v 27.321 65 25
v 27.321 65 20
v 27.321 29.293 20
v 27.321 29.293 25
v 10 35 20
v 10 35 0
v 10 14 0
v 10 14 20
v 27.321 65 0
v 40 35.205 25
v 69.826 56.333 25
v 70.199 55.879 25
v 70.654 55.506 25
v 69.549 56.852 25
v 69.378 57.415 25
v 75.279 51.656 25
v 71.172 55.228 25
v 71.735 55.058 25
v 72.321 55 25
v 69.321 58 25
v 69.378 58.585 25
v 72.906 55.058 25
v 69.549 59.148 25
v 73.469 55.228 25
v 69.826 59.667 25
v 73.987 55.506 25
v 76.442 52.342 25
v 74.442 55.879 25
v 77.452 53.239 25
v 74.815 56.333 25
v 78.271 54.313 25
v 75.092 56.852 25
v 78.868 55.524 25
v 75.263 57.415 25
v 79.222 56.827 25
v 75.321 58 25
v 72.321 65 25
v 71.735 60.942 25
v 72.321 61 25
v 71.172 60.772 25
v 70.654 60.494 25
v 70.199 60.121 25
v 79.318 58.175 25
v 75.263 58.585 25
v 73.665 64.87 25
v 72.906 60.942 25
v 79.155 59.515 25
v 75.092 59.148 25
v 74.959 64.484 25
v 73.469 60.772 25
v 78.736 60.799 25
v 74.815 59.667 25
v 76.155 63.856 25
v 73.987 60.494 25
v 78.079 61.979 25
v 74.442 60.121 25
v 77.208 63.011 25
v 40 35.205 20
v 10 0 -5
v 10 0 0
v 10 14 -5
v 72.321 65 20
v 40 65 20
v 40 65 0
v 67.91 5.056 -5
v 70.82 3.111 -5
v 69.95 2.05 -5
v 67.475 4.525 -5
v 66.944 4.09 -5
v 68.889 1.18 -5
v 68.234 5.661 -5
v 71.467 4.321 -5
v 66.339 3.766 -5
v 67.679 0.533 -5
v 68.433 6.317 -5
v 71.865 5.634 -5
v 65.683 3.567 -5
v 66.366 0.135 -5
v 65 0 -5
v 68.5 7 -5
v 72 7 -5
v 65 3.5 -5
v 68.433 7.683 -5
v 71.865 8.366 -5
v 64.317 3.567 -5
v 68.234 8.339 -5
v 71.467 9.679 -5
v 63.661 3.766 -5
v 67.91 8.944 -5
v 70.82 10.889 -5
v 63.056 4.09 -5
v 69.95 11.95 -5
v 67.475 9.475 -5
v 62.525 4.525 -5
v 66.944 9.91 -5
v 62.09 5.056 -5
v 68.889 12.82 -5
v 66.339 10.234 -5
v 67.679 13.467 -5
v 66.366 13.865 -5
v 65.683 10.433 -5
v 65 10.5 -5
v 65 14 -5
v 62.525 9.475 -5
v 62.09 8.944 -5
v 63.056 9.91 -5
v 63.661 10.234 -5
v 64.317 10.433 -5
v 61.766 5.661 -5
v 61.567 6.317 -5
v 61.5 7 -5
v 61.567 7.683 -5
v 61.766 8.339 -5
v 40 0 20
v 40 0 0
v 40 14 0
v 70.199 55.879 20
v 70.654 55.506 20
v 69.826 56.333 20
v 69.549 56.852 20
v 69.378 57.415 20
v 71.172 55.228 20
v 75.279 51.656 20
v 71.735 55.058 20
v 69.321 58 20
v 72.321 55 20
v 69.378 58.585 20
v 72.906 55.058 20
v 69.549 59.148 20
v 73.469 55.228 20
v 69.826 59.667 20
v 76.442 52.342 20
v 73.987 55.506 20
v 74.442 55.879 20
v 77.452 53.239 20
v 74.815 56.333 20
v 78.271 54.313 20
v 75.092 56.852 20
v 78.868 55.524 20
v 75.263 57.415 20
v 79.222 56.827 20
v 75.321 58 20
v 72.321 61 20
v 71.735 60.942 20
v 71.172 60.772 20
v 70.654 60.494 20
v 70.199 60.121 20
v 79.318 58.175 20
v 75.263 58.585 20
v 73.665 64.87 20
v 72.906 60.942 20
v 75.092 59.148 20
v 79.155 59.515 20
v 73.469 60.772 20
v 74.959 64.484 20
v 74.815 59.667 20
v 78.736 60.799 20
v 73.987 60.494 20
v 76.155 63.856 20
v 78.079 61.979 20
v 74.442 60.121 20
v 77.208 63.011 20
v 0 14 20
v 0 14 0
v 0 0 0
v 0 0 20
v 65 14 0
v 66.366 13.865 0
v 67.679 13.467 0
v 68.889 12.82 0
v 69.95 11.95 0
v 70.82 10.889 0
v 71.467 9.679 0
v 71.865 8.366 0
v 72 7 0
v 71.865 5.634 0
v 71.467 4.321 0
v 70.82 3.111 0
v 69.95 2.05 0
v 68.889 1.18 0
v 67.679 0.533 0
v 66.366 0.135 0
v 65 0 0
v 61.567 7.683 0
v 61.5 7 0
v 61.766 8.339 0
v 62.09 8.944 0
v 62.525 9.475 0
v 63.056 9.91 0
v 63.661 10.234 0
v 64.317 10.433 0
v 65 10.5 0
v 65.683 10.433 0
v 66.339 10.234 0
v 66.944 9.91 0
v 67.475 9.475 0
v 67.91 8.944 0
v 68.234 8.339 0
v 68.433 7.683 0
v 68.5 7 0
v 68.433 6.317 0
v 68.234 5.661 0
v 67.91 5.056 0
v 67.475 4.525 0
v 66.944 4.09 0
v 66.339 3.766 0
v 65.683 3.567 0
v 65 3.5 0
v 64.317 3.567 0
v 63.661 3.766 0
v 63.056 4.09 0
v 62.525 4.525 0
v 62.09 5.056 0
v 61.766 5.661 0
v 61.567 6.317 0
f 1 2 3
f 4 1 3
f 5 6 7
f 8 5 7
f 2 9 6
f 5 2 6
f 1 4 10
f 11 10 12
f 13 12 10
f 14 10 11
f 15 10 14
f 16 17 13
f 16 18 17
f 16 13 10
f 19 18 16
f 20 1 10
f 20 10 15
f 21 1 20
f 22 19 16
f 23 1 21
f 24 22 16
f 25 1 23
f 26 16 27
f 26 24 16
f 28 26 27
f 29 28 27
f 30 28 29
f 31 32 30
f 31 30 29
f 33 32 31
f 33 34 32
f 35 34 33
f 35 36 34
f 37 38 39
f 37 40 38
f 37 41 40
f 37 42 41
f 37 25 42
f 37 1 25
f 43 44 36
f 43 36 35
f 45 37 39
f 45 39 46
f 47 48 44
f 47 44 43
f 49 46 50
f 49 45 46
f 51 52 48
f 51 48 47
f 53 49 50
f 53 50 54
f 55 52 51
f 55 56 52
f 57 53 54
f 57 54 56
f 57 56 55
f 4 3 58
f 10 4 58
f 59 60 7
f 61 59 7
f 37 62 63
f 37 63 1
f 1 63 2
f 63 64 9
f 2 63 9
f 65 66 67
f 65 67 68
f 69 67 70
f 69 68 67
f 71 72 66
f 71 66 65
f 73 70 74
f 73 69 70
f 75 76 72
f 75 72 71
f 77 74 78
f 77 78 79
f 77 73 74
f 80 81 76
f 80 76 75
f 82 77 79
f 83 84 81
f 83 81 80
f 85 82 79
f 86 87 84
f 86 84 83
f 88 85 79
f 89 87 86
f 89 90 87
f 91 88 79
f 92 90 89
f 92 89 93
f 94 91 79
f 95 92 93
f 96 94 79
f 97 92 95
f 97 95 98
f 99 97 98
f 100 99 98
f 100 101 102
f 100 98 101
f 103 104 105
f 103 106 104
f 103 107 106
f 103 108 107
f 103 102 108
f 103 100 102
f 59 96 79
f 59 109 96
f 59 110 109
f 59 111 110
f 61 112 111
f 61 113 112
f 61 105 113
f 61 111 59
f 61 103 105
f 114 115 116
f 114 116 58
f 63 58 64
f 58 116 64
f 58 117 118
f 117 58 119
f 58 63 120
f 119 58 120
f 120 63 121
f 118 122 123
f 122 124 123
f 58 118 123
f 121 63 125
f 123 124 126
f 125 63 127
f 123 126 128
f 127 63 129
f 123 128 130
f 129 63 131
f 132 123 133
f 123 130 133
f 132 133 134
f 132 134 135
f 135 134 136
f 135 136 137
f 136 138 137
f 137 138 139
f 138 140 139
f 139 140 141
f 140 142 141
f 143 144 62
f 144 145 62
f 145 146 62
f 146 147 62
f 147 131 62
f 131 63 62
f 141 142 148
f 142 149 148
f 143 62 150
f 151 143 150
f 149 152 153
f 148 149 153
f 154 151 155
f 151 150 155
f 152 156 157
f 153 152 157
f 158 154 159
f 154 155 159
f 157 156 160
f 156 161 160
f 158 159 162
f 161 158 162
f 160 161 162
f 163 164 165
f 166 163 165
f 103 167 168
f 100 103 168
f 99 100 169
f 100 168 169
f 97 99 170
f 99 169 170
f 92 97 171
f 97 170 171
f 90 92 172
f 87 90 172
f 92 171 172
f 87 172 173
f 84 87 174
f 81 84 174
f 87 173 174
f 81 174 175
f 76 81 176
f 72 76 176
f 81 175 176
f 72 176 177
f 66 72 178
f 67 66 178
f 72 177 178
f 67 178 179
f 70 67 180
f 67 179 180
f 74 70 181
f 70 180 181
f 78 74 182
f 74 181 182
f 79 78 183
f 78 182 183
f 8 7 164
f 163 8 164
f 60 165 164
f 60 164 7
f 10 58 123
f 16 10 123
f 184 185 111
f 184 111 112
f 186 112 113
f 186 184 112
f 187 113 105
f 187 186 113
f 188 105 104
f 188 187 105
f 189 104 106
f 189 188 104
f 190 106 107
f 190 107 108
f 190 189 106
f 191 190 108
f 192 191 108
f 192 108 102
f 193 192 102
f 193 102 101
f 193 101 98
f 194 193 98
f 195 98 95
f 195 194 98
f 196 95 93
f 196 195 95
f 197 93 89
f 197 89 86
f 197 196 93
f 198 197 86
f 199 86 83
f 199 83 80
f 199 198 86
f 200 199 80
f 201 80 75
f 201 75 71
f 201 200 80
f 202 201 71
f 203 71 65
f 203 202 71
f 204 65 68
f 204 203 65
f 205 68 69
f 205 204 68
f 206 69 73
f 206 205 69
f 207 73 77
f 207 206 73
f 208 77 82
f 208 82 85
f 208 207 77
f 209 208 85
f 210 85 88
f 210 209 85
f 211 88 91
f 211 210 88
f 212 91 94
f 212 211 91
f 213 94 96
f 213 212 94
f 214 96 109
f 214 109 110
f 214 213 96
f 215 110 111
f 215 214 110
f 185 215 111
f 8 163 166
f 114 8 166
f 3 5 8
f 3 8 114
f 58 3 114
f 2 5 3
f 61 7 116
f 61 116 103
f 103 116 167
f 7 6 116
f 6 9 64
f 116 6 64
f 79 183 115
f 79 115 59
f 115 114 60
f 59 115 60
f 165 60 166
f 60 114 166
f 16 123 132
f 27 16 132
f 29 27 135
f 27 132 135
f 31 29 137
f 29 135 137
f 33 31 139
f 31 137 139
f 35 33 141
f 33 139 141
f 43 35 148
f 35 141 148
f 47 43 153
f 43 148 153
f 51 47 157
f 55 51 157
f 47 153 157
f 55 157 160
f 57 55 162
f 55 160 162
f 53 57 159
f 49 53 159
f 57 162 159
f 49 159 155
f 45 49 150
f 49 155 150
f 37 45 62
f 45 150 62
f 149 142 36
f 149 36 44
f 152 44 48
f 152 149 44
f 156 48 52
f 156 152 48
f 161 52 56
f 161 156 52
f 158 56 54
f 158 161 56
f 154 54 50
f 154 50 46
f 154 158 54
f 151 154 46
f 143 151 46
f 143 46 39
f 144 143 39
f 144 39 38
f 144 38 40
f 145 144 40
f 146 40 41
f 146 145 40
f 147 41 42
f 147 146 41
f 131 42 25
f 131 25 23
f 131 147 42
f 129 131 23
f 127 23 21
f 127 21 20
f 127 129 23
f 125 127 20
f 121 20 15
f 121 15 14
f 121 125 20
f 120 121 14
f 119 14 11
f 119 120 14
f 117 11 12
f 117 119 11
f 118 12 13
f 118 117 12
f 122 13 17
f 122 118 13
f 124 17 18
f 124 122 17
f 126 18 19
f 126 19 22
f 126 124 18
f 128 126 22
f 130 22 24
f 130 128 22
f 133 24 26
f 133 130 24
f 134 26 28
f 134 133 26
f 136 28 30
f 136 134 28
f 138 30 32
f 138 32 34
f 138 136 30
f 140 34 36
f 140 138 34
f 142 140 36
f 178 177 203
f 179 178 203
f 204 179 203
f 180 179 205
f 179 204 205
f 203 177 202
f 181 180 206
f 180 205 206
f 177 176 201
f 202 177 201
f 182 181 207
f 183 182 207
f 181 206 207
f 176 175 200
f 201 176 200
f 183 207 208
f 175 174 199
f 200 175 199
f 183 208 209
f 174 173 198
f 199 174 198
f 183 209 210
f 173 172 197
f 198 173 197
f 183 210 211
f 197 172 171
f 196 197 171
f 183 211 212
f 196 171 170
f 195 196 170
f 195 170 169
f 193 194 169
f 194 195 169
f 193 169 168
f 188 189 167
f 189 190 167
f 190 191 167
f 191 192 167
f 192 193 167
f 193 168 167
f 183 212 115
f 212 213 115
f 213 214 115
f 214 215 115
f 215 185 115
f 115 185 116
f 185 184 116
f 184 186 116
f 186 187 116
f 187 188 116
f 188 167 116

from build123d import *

# Parameters (mm, degrees)
BOSS_EXTRUDE1_DEPTH = 20
SKETCH2_R           = 7
SKETCH2_R_2         = 3
BOSS_EXTRUDE2_DEPTH = 5
SKETCH3_W           = 30
SKETCH3_H           = 14
SKETCH3_R           = 7
SKETCH3_R_2         = 3.5
BOSS_EXTRUDE3_DEPTH = 5


with BuildPart() as part:
    # Sketch1 → Boss-Extrude1 (new body)
    with BuildSketch(Plane.XY):
        Polygon((0, 0), (40, 0), (40, 65), (27.320508076, 65), (10, 35), (10, 14), (0, 14), align=None)
    extrude(amount=BOSS_EXTRUDE1_DEPTH)

    # Sketch2 → Boss-Extrude2 (add)
    # profile 1 of 3: a face of its own
    with BuildSketch(Plane.XY.offset(20)):
        Polygon((40, 65), (27.320508076, 65), (27.320508076, 29.29250995), (40, 35.205054136), align=None)
    # profile 2 of 3: a face of its own
    with BuildSketch(Plane.XY.offset(20)):
        with BuildLine():
            Line((72.320508076, 65), (40, 65))
            Line((40, 65), (40, 35.205054136))
            Line((40, 35.205054136), (75.278835908, 51.655845491))
            ThreePointArc((75.278835908, 51.655845491), (65.486436026, 56.484922702), (72.320508076, 65))
        make_face()
    # profile 3 of 3: a face of its own
    with BuildSketch(Plane.XY.offset(20)):
        with Locations((72.320508076, 58)):
            Circle(SKETCH2_R)
        with Locations((72.320508076, 58)):
            Circle(SKETCH2_R_2, mode=Mode.SUBTRACT)
    extrude(amount=BOSS_EXTRUDE2_DEPTH)

    # Sketch3 → Boss-Extrude3 (add)
    # profile 1 of 3: a face of its own
    with BuildSketch(Plane(origin=(0, 0, 0), x_dir=(-1, 0, 0), z_dir=(0, 0, -1))):
        with BuildLine():
            Line((-40, 0), (-40, 14))
            Line((-40, 14), (-65, 14))
            ThreePointArc((-65, 14), (-60.050252532, 11.949747468), (-58, 7))
            ThreePointArc((-58, 7), (-60.050252532, 2.050252532), (-65, 0))
            Line((-65, 0), (-40, 0))
        make_face()
    # profile 2 of 3: a face of its own
    with BuildSketch(Plane(origin=(0, 0, 0), x_dir=(-1, 0, 0), z_dir=(0, 0, -1))):
        with Locations((-25, 7)):
            Rectangle(SKETCH3_W, SKETCH3_H)
    # profile 3 of 3: a face of its own
    with BuildSketch(Plane(origin=(0, 0, 0), x_dir=(-1, 0, 0), z_dir=(0, 0, -1))):
        with Locations((-65, 7)):
            Circle(SKETCH3_R)
        with Locations((-65, 7)):
            Circle(SKETCH3_R_2, mode=Mode.SUBTRACT)
    extrude(amount=BOSS_EXTRUDE3_DEPTH)


solid = part.part
